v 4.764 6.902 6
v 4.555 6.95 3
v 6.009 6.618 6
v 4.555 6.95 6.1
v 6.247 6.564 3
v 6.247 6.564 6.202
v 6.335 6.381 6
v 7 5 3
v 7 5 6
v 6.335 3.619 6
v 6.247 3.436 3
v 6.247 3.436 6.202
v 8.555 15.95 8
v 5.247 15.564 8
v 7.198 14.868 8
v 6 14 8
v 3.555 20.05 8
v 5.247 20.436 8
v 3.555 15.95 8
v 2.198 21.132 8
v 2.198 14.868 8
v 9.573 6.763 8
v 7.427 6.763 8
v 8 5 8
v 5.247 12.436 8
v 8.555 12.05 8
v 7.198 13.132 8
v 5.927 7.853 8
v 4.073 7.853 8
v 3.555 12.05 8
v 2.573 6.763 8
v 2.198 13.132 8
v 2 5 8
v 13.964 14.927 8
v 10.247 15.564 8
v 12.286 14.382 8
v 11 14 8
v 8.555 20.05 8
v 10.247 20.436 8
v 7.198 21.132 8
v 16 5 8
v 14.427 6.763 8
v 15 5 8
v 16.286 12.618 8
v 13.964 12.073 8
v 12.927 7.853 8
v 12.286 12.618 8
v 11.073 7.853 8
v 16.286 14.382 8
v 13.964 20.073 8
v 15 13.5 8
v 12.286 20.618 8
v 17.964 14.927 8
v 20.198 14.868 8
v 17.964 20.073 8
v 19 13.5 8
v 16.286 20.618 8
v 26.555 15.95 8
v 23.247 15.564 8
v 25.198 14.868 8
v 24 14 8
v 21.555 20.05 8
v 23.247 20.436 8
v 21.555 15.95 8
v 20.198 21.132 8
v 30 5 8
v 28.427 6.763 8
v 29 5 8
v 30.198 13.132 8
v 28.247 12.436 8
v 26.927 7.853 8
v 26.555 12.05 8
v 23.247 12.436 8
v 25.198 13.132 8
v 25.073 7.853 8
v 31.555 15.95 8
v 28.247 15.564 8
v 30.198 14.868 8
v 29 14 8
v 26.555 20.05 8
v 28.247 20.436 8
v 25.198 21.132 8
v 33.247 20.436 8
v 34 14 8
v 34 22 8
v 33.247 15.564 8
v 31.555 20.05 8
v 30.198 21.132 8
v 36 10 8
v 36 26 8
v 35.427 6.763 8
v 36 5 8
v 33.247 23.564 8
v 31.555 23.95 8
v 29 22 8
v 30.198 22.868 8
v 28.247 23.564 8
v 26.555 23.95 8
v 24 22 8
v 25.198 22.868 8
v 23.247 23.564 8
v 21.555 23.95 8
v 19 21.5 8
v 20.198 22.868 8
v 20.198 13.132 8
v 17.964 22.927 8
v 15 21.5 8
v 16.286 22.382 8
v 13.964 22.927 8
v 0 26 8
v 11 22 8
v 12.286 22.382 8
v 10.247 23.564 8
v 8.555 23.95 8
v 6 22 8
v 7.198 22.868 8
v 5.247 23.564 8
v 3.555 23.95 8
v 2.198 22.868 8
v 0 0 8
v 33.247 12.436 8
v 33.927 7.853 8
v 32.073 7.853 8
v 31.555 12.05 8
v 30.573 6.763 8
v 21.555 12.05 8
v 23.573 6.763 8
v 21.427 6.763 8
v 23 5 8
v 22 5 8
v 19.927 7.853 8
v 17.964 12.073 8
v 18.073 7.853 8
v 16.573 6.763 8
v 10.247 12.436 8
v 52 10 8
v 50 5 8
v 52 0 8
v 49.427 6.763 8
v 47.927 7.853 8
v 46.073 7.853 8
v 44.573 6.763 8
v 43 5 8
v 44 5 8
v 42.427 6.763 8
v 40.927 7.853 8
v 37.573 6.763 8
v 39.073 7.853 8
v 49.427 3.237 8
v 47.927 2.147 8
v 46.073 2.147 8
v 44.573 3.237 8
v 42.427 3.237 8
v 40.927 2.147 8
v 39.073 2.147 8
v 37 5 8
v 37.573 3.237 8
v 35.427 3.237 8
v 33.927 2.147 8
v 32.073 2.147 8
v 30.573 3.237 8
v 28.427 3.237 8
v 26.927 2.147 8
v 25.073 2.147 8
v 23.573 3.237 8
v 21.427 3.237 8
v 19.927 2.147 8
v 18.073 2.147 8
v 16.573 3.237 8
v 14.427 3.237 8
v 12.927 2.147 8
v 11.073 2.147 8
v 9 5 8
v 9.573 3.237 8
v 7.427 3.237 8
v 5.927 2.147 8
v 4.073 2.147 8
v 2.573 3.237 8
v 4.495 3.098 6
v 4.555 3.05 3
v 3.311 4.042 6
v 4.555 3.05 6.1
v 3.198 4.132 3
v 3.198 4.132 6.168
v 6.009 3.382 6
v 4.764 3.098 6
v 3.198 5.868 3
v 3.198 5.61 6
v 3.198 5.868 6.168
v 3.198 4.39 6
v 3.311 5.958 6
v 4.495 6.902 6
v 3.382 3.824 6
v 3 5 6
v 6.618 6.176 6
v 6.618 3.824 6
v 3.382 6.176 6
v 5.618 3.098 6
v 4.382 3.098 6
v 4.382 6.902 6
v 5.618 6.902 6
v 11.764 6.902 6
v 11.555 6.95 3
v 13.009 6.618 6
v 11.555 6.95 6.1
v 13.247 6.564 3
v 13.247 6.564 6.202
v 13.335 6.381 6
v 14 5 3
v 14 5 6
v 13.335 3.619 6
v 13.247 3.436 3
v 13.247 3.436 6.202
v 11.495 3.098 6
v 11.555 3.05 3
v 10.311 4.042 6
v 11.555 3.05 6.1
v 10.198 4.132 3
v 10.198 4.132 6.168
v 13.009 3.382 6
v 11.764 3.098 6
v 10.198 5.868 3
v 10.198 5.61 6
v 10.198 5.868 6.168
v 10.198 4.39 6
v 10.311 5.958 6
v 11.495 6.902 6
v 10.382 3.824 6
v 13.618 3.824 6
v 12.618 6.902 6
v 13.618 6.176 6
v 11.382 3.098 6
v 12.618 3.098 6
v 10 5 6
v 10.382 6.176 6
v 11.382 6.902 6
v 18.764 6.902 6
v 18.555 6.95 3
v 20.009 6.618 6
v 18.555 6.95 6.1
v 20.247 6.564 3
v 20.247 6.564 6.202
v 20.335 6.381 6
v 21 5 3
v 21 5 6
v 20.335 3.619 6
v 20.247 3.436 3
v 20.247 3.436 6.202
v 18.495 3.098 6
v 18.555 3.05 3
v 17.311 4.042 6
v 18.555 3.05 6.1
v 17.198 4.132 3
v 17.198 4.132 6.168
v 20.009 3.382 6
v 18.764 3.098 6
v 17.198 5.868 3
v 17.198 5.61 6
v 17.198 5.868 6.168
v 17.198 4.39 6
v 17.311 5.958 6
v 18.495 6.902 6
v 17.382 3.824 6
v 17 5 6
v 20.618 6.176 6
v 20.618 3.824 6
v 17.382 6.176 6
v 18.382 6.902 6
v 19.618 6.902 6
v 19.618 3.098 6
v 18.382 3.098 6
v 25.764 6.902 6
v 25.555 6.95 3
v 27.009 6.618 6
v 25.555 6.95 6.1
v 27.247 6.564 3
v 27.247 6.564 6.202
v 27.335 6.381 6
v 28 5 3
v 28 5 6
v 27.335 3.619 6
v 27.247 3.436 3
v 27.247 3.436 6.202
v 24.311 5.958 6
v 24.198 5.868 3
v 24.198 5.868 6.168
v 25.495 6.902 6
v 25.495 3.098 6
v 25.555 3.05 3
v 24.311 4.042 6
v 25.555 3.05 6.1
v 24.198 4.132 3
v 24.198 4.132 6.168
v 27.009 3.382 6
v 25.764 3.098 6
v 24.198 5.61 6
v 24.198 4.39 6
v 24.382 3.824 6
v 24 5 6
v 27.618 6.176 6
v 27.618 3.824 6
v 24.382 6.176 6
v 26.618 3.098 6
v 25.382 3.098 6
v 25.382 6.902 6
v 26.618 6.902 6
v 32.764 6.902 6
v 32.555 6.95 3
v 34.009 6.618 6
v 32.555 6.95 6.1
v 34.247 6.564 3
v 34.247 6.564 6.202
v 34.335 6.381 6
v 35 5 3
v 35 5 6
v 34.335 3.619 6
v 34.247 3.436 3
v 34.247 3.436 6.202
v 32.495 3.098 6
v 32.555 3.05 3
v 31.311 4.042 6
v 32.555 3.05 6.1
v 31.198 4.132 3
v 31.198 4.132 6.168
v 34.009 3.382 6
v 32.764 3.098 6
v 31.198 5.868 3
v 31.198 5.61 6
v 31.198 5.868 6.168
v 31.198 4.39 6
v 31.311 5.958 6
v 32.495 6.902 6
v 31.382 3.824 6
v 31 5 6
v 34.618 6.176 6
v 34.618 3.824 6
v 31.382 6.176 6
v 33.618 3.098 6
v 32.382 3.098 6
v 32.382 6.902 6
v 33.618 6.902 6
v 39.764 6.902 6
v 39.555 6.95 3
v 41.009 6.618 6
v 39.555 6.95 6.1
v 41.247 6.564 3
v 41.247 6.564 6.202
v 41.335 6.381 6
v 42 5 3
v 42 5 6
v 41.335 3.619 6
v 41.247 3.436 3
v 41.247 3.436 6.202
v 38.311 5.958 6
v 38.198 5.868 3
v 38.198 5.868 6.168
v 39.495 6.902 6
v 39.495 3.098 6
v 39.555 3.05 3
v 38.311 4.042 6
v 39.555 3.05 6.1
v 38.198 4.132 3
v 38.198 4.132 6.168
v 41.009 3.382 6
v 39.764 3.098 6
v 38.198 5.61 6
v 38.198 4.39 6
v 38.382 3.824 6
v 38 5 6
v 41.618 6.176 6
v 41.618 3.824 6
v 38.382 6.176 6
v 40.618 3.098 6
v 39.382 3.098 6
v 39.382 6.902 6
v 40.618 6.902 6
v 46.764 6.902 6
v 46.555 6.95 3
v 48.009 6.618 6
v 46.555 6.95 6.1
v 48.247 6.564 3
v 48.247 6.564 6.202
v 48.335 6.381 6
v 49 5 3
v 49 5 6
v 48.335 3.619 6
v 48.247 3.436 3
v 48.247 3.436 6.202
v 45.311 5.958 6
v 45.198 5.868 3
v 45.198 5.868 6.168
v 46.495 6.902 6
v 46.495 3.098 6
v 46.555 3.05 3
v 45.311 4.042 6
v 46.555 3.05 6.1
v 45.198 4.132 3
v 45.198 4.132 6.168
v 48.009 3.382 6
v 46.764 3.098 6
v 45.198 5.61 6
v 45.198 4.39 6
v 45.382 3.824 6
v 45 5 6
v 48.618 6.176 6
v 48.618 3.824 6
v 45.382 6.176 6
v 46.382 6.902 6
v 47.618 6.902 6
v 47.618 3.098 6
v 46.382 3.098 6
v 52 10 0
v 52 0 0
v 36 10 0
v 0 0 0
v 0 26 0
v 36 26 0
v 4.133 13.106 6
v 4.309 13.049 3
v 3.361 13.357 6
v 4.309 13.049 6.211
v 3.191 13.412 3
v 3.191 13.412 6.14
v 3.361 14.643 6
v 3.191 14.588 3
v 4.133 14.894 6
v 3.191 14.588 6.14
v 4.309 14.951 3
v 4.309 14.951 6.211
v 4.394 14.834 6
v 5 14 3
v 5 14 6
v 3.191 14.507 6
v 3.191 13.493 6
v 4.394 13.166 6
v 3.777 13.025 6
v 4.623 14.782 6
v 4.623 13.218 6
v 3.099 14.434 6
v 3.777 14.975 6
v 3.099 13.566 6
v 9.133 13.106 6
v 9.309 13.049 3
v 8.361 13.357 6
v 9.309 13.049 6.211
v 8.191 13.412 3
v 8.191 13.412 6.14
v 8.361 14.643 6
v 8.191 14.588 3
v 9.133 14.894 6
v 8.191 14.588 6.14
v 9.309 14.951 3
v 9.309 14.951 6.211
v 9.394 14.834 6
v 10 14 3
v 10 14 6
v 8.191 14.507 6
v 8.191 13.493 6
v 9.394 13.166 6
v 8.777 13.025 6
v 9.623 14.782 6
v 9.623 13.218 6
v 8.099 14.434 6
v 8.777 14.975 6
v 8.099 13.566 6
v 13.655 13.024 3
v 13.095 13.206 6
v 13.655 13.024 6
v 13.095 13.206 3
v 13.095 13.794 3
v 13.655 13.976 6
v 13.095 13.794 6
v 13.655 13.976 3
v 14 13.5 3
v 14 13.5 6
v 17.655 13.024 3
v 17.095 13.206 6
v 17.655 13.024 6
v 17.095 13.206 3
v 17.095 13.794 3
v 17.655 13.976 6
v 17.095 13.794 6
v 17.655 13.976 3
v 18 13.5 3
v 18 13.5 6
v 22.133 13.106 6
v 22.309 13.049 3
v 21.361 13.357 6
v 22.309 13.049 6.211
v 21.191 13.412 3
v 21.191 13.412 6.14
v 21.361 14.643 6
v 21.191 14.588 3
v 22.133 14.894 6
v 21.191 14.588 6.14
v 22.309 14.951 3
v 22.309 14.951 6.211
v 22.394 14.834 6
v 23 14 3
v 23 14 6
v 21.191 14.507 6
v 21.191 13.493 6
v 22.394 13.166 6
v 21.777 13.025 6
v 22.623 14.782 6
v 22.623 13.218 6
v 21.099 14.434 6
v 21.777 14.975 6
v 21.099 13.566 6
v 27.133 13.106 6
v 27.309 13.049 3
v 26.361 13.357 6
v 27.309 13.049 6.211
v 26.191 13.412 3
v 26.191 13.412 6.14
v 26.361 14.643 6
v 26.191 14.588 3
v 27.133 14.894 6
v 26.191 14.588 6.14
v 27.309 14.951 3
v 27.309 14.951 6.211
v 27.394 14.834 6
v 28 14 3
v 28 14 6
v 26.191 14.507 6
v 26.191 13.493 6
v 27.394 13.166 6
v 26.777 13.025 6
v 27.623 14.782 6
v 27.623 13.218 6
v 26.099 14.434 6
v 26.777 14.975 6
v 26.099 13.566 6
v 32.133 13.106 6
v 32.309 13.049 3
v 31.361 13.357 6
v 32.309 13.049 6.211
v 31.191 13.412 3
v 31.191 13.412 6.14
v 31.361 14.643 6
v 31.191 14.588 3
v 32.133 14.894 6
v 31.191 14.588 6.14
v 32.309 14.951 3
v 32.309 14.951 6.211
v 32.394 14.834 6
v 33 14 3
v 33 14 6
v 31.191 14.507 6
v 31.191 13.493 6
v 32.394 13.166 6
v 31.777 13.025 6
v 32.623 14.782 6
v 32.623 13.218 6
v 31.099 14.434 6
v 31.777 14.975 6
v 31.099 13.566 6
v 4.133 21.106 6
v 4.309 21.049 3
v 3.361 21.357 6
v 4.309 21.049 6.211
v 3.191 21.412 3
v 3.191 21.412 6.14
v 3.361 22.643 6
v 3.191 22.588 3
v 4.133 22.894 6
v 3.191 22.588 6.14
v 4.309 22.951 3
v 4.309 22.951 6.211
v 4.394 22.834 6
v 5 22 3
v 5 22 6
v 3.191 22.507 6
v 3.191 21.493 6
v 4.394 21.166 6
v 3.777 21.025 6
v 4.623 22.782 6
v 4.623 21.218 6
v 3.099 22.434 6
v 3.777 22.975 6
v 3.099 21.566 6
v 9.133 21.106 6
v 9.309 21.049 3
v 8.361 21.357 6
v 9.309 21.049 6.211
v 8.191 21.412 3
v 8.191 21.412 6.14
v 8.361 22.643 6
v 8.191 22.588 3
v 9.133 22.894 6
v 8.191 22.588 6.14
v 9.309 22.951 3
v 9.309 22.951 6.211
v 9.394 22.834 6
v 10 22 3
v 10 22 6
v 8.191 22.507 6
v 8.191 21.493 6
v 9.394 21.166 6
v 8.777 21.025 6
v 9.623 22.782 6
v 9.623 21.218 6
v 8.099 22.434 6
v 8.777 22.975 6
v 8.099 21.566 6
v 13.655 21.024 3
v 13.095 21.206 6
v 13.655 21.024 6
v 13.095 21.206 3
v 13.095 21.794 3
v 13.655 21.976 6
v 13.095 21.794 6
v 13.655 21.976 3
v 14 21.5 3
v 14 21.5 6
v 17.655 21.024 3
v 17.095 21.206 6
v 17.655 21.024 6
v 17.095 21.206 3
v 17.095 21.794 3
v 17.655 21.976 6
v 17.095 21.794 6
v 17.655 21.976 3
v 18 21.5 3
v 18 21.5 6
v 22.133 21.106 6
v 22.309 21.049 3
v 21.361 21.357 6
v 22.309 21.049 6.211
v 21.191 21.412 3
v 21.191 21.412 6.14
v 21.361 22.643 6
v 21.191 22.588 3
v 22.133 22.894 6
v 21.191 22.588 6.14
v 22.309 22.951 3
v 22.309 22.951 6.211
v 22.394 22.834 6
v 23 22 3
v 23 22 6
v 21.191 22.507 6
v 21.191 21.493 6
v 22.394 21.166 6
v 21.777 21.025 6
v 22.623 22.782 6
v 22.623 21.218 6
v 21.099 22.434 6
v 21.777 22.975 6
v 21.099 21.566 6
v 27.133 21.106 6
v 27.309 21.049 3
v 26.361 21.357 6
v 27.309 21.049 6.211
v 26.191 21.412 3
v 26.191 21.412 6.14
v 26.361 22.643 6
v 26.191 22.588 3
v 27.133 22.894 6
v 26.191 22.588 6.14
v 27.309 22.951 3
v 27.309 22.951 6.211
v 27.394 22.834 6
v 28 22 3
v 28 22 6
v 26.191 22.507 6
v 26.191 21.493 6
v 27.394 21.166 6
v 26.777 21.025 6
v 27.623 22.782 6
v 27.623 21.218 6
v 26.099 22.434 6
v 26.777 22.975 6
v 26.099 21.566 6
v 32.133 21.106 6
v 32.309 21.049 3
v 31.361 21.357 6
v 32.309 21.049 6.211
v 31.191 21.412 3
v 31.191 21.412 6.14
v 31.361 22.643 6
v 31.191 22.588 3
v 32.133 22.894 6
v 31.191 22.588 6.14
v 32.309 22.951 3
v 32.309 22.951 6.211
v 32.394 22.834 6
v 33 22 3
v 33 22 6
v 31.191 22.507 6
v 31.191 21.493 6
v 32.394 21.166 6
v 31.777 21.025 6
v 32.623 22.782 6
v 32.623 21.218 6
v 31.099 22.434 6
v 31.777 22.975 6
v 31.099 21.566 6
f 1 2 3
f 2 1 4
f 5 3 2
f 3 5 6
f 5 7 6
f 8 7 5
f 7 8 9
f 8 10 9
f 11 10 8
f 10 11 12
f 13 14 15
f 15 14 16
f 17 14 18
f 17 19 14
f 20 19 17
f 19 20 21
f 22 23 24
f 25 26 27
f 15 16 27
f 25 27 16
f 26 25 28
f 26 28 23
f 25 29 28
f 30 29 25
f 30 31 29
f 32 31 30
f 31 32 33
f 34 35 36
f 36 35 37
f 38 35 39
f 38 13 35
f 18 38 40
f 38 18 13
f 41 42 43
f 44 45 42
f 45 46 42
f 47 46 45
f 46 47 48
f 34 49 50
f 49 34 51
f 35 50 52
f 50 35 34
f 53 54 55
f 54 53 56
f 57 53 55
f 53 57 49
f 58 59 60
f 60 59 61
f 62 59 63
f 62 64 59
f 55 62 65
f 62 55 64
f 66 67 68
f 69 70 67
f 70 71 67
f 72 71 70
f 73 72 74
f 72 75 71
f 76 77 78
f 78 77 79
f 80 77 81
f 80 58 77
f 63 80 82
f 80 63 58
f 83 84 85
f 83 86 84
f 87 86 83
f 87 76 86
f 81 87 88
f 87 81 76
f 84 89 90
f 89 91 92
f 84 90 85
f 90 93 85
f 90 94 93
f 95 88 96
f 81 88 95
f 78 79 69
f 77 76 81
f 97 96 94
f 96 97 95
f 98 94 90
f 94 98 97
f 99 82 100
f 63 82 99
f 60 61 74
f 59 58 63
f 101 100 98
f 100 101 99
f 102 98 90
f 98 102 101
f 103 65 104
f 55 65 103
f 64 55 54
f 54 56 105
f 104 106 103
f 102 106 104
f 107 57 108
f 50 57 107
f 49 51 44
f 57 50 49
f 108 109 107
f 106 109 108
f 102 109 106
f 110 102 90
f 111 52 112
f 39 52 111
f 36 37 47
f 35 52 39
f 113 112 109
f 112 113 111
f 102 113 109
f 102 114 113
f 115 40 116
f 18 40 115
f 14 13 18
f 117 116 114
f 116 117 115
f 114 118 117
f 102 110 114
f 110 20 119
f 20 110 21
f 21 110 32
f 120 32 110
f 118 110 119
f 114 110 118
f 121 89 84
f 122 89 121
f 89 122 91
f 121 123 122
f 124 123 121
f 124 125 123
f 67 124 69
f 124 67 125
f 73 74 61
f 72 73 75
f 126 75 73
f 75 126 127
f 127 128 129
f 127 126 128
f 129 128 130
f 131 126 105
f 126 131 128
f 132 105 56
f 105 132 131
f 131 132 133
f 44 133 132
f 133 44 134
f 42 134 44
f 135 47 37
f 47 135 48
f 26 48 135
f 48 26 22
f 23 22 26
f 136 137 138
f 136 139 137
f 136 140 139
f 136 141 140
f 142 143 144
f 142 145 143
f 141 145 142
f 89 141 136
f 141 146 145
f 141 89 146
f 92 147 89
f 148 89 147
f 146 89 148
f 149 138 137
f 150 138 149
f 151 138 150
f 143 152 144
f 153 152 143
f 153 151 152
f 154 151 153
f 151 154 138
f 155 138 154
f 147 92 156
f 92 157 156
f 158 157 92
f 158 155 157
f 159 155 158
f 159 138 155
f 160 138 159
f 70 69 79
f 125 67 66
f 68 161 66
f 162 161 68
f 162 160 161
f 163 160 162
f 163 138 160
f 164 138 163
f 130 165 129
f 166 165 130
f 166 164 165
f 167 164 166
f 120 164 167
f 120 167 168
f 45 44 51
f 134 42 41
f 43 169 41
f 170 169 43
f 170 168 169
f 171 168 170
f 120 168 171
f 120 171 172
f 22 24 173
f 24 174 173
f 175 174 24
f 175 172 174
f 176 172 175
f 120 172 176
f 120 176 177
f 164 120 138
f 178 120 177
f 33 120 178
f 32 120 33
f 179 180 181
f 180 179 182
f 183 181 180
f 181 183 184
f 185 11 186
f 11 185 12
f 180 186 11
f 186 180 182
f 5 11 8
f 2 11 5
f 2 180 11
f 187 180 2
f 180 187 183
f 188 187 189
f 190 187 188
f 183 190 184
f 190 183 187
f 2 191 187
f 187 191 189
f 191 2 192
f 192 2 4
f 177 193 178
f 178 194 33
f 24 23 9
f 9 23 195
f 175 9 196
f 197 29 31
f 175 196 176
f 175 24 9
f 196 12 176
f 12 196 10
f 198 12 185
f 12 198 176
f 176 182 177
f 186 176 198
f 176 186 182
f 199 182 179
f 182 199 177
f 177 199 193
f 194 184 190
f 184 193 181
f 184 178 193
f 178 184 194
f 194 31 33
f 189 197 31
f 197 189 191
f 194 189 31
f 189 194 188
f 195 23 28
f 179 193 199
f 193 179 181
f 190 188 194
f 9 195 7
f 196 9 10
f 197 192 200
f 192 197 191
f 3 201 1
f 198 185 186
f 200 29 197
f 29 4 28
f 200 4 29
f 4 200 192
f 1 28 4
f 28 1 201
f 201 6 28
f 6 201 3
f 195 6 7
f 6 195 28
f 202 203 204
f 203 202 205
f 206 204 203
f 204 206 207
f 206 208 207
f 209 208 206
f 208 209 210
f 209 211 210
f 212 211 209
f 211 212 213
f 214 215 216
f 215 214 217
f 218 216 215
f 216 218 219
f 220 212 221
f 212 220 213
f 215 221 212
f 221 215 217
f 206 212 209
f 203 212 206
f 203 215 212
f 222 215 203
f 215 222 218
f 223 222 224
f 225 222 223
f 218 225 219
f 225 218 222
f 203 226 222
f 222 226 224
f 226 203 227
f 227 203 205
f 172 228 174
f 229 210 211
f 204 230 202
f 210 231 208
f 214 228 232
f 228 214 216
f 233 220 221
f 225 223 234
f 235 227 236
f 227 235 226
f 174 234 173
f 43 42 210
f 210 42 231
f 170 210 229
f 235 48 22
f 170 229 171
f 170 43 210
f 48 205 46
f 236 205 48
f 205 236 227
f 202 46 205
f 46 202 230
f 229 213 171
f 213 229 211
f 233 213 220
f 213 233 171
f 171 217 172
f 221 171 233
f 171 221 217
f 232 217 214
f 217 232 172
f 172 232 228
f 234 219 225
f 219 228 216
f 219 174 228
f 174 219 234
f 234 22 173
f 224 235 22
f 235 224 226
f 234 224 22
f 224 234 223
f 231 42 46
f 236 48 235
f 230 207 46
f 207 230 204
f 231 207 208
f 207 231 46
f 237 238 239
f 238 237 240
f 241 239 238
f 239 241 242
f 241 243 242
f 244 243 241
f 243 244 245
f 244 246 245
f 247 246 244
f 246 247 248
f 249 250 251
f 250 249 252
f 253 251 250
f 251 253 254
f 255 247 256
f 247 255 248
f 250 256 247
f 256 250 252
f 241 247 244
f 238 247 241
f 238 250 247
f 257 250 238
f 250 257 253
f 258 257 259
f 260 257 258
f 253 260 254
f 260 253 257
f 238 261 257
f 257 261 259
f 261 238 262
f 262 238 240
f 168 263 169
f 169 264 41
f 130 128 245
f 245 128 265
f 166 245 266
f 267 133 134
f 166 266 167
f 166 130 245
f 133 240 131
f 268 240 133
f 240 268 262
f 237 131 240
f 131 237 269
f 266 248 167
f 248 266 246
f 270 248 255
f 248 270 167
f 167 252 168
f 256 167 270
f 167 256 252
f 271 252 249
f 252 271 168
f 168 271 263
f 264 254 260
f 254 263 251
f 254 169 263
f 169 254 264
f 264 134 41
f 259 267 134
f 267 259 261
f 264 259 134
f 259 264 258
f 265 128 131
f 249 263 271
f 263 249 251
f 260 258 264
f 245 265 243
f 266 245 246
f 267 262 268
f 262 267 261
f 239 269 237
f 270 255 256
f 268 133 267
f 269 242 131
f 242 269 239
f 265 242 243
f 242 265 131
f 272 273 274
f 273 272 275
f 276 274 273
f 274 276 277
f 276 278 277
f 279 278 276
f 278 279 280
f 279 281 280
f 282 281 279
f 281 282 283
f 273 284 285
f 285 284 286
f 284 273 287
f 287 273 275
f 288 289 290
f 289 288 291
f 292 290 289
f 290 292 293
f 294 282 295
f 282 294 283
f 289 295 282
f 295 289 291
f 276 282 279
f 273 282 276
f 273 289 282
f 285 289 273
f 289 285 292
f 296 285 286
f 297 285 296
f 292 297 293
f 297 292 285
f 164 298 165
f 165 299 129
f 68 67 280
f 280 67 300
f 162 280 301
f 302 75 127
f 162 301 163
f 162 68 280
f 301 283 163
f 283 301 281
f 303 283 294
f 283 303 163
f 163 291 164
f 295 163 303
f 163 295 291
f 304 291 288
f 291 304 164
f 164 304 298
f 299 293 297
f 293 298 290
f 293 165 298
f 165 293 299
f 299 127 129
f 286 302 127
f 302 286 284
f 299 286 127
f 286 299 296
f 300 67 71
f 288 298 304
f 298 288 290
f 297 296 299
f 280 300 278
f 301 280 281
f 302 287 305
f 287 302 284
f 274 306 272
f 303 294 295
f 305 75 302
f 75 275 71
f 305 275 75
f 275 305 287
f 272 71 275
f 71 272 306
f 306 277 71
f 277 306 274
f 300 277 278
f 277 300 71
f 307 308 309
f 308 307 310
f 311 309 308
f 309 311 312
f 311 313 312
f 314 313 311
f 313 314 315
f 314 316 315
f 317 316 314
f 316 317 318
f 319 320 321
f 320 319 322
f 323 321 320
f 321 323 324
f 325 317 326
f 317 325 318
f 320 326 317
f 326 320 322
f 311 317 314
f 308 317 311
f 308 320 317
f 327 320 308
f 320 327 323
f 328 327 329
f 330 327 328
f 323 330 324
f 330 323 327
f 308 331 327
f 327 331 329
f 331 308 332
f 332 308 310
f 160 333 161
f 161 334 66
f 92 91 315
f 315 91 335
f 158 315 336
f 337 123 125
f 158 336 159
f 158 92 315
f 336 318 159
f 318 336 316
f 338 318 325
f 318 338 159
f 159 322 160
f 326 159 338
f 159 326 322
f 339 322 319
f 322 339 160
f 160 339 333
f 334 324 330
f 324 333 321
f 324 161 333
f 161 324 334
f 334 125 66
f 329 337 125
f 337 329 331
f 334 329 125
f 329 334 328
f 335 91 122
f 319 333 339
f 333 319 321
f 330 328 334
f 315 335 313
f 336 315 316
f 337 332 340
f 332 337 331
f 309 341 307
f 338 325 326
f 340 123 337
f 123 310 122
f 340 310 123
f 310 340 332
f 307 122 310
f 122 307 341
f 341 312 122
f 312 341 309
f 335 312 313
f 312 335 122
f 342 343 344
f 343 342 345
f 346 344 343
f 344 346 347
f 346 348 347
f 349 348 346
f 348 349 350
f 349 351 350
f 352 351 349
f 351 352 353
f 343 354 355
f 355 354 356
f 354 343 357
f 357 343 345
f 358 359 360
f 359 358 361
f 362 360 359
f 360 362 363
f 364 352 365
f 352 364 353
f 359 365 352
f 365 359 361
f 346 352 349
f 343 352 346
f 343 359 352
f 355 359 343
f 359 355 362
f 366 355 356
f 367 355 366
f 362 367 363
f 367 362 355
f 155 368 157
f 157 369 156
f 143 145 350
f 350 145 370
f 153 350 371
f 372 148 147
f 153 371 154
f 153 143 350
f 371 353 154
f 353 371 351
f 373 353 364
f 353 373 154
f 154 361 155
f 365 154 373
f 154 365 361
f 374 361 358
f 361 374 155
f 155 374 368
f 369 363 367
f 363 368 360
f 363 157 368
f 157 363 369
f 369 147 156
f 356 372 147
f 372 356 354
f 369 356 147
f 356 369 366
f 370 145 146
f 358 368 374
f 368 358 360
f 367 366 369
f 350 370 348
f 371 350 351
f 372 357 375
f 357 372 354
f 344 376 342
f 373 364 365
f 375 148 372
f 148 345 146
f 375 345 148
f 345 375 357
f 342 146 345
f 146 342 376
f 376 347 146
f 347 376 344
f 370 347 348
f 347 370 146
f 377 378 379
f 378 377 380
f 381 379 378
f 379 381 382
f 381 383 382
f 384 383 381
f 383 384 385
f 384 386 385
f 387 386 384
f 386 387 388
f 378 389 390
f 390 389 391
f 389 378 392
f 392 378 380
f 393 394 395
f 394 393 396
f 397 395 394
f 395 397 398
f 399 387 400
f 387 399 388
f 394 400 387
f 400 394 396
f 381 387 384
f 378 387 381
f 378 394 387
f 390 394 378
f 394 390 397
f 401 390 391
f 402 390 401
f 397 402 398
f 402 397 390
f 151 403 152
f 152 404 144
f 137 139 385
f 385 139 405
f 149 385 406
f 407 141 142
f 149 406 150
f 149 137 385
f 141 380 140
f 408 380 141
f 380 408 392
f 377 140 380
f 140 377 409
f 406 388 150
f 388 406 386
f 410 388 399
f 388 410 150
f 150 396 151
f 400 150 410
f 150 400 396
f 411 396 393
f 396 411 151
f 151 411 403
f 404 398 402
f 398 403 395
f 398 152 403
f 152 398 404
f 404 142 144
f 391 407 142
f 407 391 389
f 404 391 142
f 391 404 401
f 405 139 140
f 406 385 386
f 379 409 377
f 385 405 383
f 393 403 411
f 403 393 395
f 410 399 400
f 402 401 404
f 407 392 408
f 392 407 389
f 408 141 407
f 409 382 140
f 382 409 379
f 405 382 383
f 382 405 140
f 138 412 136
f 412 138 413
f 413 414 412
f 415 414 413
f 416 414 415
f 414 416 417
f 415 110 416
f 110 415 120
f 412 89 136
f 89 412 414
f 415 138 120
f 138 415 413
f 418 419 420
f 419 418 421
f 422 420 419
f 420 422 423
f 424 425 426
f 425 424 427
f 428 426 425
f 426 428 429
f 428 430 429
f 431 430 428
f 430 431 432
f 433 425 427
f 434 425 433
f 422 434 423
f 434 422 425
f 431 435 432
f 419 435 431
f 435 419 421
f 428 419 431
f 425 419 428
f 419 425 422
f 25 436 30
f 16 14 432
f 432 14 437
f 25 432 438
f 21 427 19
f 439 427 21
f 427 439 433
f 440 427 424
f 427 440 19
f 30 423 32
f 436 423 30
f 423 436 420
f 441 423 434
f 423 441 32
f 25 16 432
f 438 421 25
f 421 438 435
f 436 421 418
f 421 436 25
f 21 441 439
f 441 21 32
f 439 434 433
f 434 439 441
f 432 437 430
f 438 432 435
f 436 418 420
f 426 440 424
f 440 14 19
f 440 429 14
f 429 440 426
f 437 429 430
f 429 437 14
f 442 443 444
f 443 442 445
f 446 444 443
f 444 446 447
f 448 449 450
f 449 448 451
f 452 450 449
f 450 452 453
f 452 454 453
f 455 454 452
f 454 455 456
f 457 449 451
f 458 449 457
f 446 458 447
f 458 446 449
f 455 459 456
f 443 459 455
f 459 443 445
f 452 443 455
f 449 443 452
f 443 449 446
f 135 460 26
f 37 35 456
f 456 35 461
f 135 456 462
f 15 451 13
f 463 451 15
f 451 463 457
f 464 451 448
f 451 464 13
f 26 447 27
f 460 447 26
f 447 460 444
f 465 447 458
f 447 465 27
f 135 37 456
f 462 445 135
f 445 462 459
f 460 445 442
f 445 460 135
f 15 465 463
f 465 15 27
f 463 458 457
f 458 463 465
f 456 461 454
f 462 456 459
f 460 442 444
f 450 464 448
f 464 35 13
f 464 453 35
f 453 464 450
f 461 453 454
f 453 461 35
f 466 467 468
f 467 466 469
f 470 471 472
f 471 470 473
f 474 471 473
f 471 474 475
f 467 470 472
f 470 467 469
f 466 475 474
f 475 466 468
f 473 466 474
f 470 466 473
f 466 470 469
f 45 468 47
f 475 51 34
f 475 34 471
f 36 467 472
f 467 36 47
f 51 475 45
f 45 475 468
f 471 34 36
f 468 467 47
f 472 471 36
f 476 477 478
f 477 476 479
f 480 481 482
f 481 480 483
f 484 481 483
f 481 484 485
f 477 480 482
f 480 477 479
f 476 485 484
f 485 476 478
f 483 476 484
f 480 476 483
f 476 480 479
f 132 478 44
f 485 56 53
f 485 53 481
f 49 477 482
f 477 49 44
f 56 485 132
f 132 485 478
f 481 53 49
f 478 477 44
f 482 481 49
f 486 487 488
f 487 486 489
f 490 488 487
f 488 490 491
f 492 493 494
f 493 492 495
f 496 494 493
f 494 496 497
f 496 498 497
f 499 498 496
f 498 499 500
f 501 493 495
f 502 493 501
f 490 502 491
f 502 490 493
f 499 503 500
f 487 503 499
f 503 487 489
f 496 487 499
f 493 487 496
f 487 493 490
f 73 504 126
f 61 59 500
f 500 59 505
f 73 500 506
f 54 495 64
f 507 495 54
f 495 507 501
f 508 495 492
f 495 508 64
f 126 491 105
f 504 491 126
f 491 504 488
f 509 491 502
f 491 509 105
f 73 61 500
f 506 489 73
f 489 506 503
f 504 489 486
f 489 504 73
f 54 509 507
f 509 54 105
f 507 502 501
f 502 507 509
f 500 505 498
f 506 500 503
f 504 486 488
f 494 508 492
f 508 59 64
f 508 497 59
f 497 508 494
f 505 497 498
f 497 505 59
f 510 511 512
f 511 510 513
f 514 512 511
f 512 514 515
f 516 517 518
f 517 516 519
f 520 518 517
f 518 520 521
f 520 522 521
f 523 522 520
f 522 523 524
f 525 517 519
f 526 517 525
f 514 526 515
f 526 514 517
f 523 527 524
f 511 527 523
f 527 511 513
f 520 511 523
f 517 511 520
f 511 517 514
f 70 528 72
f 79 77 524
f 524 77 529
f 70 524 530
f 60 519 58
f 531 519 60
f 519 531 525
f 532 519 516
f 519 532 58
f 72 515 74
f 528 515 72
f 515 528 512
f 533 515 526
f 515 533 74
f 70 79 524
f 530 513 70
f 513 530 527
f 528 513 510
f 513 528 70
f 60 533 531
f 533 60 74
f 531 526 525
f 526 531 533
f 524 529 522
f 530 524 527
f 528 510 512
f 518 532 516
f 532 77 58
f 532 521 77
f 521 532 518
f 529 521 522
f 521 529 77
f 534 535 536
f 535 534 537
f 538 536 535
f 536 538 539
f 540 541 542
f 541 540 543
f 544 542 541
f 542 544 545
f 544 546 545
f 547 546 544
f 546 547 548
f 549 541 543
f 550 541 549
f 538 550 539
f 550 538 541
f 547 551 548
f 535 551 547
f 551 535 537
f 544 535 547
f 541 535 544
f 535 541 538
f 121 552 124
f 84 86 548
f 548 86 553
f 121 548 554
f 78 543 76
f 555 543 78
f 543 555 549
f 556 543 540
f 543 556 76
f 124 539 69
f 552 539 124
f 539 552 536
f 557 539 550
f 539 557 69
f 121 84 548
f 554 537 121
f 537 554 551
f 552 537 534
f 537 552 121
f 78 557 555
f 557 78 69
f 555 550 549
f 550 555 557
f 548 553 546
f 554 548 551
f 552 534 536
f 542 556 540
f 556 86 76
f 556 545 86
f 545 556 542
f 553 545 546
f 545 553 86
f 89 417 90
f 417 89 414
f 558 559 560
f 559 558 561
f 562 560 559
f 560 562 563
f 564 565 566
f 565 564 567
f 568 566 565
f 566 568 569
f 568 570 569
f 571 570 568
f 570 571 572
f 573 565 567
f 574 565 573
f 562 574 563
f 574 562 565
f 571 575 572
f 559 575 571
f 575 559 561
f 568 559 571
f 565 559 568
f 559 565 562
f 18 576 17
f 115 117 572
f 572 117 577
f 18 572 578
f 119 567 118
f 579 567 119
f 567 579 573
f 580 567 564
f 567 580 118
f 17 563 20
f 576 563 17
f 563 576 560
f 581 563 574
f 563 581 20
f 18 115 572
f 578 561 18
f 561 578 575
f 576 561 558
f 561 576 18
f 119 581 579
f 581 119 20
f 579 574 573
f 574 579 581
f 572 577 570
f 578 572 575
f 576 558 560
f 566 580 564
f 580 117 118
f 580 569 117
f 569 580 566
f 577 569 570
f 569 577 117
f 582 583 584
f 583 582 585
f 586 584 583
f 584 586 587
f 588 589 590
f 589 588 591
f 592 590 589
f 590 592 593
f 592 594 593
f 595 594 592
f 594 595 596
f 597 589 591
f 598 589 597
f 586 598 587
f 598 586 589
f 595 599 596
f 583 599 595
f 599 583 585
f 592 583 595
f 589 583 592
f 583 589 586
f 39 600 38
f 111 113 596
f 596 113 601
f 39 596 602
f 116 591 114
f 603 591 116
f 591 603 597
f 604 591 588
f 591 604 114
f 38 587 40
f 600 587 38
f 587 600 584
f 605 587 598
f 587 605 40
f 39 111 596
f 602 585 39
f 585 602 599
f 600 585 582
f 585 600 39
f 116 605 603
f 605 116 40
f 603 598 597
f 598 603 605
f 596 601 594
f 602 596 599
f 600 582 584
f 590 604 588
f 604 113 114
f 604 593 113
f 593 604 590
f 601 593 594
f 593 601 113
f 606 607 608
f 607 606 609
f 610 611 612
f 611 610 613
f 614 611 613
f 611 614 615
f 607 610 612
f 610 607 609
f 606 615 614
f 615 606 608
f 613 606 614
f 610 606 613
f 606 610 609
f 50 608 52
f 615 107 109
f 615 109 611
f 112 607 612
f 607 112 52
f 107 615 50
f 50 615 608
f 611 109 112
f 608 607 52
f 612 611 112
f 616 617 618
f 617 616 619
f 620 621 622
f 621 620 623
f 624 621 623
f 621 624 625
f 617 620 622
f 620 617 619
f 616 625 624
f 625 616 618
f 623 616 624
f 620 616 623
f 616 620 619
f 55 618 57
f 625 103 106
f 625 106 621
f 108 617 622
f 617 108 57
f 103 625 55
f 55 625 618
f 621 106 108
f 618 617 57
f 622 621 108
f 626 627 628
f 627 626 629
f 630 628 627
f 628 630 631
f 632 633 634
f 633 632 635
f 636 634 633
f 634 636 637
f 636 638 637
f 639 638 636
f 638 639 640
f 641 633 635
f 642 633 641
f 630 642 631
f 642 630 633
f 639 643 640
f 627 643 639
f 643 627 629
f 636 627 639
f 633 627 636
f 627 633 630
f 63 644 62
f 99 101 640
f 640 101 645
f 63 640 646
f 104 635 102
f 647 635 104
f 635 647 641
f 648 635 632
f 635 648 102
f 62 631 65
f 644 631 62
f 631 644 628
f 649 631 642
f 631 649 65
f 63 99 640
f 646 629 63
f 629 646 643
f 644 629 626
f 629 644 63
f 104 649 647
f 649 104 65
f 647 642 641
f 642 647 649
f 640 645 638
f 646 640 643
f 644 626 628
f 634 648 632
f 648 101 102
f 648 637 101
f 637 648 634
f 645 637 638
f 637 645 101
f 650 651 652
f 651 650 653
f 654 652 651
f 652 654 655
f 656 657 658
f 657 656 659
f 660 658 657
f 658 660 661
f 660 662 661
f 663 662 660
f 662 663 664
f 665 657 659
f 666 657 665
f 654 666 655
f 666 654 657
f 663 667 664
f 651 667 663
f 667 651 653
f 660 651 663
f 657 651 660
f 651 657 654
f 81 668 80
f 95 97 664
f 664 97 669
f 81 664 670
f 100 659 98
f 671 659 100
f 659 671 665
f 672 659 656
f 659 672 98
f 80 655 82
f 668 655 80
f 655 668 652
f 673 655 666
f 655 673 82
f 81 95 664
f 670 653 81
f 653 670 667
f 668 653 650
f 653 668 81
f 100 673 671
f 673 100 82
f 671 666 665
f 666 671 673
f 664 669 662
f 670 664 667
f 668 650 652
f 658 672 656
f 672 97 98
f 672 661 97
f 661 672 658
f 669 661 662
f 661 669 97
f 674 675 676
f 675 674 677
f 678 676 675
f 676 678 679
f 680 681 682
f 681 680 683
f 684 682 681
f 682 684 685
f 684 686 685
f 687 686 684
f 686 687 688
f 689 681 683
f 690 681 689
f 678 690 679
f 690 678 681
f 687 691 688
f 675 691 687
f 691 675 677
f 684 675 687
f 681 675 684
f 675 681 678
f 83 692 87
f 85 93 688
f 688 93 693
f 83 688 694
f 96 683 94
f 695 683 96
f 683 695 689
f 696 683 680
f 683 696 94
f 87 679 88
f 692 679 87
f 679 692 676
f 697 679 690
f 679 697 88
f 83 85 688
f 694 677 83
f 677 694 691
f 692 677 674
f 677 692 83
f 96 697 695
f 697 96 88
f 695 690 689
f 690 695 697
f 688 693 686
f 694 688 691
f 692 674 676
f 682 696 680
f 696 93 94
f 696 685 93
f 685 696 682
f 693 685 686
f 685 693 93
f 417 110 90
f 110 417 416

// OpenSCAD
row1=[4,4,4,4,4,4,4];
row2=[2,2,1,1,2,2,2];
row3=[2,2,1,1,2,2,2];
row1_depth=0;
row2_depth=4+2*3;
row3_depth=4+2+4*3;
space=3;
depth=5;
angle=0;

size_arrays=[row1,row2,row3];
row_size_array=[row1_depth,row2_depth,row3_depth];

multi_sockets(size_arrays,row_size_array,space,depth,angle);

function partialsum(list,start,end) = [for (sum=0, i=start; i<=end; nsum=sum+list[i], i=i+1, sum=nsum) sum];
function notfirst(list,index) = (index==0 ? 0 : list);


module multi_sockets(size_arrays,row_size_array,space,depth,angle)
{
    for(count=[0:1:len(size_arrays)-1])
    {
        size_array=size_arrays[count];
        echo(max(notfirst(size_arrays[count-1],count)));
        translate([0,row_size_array[count],0])
        {
            width = max(size_array)+2*space;
            height = depth+space;
            length_vec      = partialsum(size_array,0,len(size_array)-1);
            total_length    = length_vec[len(length_vec)-1]
                            + size_array[len(size_array)-1]
                            + space*(len(size_array)-1)
                            + 2*space;
            
            // upper wedge
            rotate([90,0,90])
            {
                linear_extrude(height = total_length)
                {
                    polygon([[0,0],[0,height*cos(angle)],[height*sin(angle),height*cos(angle)]]);
                }
            }

            // lower wedge
            translate([0,0,0.000001]) // fix for non manifold
            {
                rotate([0,90,0])
                {
                    linear_extrude(height = total_length)
                    {
                        polygon([[0,0],[width*sin(angle),0],[width*sin(angle),width*cos(angle)]]);
                    }
                }
            }

            // main body
            rotate([-angle,0,0])
            {
                difference()
                {
                    cube([total_length,width,depth+space]);
                    
                    for(num=[0:1:len(size_array)-1])
                    {
                        off=partialsum(size_array,0,num);
                        translate([off[num]+size_array[num]/2+num*space+space,
                                   size_array[num]/2+space,
                                   space])
                        {
                            cylinder(h=depth,d=size_array[num]);
                            translate([0,0,depth-2])
                            {
                                cylinder(h=2,d1=size_array[num],d2=size_array[num]+2);
                            }
                        }
                    }
                }
            }
        }
    }
}
